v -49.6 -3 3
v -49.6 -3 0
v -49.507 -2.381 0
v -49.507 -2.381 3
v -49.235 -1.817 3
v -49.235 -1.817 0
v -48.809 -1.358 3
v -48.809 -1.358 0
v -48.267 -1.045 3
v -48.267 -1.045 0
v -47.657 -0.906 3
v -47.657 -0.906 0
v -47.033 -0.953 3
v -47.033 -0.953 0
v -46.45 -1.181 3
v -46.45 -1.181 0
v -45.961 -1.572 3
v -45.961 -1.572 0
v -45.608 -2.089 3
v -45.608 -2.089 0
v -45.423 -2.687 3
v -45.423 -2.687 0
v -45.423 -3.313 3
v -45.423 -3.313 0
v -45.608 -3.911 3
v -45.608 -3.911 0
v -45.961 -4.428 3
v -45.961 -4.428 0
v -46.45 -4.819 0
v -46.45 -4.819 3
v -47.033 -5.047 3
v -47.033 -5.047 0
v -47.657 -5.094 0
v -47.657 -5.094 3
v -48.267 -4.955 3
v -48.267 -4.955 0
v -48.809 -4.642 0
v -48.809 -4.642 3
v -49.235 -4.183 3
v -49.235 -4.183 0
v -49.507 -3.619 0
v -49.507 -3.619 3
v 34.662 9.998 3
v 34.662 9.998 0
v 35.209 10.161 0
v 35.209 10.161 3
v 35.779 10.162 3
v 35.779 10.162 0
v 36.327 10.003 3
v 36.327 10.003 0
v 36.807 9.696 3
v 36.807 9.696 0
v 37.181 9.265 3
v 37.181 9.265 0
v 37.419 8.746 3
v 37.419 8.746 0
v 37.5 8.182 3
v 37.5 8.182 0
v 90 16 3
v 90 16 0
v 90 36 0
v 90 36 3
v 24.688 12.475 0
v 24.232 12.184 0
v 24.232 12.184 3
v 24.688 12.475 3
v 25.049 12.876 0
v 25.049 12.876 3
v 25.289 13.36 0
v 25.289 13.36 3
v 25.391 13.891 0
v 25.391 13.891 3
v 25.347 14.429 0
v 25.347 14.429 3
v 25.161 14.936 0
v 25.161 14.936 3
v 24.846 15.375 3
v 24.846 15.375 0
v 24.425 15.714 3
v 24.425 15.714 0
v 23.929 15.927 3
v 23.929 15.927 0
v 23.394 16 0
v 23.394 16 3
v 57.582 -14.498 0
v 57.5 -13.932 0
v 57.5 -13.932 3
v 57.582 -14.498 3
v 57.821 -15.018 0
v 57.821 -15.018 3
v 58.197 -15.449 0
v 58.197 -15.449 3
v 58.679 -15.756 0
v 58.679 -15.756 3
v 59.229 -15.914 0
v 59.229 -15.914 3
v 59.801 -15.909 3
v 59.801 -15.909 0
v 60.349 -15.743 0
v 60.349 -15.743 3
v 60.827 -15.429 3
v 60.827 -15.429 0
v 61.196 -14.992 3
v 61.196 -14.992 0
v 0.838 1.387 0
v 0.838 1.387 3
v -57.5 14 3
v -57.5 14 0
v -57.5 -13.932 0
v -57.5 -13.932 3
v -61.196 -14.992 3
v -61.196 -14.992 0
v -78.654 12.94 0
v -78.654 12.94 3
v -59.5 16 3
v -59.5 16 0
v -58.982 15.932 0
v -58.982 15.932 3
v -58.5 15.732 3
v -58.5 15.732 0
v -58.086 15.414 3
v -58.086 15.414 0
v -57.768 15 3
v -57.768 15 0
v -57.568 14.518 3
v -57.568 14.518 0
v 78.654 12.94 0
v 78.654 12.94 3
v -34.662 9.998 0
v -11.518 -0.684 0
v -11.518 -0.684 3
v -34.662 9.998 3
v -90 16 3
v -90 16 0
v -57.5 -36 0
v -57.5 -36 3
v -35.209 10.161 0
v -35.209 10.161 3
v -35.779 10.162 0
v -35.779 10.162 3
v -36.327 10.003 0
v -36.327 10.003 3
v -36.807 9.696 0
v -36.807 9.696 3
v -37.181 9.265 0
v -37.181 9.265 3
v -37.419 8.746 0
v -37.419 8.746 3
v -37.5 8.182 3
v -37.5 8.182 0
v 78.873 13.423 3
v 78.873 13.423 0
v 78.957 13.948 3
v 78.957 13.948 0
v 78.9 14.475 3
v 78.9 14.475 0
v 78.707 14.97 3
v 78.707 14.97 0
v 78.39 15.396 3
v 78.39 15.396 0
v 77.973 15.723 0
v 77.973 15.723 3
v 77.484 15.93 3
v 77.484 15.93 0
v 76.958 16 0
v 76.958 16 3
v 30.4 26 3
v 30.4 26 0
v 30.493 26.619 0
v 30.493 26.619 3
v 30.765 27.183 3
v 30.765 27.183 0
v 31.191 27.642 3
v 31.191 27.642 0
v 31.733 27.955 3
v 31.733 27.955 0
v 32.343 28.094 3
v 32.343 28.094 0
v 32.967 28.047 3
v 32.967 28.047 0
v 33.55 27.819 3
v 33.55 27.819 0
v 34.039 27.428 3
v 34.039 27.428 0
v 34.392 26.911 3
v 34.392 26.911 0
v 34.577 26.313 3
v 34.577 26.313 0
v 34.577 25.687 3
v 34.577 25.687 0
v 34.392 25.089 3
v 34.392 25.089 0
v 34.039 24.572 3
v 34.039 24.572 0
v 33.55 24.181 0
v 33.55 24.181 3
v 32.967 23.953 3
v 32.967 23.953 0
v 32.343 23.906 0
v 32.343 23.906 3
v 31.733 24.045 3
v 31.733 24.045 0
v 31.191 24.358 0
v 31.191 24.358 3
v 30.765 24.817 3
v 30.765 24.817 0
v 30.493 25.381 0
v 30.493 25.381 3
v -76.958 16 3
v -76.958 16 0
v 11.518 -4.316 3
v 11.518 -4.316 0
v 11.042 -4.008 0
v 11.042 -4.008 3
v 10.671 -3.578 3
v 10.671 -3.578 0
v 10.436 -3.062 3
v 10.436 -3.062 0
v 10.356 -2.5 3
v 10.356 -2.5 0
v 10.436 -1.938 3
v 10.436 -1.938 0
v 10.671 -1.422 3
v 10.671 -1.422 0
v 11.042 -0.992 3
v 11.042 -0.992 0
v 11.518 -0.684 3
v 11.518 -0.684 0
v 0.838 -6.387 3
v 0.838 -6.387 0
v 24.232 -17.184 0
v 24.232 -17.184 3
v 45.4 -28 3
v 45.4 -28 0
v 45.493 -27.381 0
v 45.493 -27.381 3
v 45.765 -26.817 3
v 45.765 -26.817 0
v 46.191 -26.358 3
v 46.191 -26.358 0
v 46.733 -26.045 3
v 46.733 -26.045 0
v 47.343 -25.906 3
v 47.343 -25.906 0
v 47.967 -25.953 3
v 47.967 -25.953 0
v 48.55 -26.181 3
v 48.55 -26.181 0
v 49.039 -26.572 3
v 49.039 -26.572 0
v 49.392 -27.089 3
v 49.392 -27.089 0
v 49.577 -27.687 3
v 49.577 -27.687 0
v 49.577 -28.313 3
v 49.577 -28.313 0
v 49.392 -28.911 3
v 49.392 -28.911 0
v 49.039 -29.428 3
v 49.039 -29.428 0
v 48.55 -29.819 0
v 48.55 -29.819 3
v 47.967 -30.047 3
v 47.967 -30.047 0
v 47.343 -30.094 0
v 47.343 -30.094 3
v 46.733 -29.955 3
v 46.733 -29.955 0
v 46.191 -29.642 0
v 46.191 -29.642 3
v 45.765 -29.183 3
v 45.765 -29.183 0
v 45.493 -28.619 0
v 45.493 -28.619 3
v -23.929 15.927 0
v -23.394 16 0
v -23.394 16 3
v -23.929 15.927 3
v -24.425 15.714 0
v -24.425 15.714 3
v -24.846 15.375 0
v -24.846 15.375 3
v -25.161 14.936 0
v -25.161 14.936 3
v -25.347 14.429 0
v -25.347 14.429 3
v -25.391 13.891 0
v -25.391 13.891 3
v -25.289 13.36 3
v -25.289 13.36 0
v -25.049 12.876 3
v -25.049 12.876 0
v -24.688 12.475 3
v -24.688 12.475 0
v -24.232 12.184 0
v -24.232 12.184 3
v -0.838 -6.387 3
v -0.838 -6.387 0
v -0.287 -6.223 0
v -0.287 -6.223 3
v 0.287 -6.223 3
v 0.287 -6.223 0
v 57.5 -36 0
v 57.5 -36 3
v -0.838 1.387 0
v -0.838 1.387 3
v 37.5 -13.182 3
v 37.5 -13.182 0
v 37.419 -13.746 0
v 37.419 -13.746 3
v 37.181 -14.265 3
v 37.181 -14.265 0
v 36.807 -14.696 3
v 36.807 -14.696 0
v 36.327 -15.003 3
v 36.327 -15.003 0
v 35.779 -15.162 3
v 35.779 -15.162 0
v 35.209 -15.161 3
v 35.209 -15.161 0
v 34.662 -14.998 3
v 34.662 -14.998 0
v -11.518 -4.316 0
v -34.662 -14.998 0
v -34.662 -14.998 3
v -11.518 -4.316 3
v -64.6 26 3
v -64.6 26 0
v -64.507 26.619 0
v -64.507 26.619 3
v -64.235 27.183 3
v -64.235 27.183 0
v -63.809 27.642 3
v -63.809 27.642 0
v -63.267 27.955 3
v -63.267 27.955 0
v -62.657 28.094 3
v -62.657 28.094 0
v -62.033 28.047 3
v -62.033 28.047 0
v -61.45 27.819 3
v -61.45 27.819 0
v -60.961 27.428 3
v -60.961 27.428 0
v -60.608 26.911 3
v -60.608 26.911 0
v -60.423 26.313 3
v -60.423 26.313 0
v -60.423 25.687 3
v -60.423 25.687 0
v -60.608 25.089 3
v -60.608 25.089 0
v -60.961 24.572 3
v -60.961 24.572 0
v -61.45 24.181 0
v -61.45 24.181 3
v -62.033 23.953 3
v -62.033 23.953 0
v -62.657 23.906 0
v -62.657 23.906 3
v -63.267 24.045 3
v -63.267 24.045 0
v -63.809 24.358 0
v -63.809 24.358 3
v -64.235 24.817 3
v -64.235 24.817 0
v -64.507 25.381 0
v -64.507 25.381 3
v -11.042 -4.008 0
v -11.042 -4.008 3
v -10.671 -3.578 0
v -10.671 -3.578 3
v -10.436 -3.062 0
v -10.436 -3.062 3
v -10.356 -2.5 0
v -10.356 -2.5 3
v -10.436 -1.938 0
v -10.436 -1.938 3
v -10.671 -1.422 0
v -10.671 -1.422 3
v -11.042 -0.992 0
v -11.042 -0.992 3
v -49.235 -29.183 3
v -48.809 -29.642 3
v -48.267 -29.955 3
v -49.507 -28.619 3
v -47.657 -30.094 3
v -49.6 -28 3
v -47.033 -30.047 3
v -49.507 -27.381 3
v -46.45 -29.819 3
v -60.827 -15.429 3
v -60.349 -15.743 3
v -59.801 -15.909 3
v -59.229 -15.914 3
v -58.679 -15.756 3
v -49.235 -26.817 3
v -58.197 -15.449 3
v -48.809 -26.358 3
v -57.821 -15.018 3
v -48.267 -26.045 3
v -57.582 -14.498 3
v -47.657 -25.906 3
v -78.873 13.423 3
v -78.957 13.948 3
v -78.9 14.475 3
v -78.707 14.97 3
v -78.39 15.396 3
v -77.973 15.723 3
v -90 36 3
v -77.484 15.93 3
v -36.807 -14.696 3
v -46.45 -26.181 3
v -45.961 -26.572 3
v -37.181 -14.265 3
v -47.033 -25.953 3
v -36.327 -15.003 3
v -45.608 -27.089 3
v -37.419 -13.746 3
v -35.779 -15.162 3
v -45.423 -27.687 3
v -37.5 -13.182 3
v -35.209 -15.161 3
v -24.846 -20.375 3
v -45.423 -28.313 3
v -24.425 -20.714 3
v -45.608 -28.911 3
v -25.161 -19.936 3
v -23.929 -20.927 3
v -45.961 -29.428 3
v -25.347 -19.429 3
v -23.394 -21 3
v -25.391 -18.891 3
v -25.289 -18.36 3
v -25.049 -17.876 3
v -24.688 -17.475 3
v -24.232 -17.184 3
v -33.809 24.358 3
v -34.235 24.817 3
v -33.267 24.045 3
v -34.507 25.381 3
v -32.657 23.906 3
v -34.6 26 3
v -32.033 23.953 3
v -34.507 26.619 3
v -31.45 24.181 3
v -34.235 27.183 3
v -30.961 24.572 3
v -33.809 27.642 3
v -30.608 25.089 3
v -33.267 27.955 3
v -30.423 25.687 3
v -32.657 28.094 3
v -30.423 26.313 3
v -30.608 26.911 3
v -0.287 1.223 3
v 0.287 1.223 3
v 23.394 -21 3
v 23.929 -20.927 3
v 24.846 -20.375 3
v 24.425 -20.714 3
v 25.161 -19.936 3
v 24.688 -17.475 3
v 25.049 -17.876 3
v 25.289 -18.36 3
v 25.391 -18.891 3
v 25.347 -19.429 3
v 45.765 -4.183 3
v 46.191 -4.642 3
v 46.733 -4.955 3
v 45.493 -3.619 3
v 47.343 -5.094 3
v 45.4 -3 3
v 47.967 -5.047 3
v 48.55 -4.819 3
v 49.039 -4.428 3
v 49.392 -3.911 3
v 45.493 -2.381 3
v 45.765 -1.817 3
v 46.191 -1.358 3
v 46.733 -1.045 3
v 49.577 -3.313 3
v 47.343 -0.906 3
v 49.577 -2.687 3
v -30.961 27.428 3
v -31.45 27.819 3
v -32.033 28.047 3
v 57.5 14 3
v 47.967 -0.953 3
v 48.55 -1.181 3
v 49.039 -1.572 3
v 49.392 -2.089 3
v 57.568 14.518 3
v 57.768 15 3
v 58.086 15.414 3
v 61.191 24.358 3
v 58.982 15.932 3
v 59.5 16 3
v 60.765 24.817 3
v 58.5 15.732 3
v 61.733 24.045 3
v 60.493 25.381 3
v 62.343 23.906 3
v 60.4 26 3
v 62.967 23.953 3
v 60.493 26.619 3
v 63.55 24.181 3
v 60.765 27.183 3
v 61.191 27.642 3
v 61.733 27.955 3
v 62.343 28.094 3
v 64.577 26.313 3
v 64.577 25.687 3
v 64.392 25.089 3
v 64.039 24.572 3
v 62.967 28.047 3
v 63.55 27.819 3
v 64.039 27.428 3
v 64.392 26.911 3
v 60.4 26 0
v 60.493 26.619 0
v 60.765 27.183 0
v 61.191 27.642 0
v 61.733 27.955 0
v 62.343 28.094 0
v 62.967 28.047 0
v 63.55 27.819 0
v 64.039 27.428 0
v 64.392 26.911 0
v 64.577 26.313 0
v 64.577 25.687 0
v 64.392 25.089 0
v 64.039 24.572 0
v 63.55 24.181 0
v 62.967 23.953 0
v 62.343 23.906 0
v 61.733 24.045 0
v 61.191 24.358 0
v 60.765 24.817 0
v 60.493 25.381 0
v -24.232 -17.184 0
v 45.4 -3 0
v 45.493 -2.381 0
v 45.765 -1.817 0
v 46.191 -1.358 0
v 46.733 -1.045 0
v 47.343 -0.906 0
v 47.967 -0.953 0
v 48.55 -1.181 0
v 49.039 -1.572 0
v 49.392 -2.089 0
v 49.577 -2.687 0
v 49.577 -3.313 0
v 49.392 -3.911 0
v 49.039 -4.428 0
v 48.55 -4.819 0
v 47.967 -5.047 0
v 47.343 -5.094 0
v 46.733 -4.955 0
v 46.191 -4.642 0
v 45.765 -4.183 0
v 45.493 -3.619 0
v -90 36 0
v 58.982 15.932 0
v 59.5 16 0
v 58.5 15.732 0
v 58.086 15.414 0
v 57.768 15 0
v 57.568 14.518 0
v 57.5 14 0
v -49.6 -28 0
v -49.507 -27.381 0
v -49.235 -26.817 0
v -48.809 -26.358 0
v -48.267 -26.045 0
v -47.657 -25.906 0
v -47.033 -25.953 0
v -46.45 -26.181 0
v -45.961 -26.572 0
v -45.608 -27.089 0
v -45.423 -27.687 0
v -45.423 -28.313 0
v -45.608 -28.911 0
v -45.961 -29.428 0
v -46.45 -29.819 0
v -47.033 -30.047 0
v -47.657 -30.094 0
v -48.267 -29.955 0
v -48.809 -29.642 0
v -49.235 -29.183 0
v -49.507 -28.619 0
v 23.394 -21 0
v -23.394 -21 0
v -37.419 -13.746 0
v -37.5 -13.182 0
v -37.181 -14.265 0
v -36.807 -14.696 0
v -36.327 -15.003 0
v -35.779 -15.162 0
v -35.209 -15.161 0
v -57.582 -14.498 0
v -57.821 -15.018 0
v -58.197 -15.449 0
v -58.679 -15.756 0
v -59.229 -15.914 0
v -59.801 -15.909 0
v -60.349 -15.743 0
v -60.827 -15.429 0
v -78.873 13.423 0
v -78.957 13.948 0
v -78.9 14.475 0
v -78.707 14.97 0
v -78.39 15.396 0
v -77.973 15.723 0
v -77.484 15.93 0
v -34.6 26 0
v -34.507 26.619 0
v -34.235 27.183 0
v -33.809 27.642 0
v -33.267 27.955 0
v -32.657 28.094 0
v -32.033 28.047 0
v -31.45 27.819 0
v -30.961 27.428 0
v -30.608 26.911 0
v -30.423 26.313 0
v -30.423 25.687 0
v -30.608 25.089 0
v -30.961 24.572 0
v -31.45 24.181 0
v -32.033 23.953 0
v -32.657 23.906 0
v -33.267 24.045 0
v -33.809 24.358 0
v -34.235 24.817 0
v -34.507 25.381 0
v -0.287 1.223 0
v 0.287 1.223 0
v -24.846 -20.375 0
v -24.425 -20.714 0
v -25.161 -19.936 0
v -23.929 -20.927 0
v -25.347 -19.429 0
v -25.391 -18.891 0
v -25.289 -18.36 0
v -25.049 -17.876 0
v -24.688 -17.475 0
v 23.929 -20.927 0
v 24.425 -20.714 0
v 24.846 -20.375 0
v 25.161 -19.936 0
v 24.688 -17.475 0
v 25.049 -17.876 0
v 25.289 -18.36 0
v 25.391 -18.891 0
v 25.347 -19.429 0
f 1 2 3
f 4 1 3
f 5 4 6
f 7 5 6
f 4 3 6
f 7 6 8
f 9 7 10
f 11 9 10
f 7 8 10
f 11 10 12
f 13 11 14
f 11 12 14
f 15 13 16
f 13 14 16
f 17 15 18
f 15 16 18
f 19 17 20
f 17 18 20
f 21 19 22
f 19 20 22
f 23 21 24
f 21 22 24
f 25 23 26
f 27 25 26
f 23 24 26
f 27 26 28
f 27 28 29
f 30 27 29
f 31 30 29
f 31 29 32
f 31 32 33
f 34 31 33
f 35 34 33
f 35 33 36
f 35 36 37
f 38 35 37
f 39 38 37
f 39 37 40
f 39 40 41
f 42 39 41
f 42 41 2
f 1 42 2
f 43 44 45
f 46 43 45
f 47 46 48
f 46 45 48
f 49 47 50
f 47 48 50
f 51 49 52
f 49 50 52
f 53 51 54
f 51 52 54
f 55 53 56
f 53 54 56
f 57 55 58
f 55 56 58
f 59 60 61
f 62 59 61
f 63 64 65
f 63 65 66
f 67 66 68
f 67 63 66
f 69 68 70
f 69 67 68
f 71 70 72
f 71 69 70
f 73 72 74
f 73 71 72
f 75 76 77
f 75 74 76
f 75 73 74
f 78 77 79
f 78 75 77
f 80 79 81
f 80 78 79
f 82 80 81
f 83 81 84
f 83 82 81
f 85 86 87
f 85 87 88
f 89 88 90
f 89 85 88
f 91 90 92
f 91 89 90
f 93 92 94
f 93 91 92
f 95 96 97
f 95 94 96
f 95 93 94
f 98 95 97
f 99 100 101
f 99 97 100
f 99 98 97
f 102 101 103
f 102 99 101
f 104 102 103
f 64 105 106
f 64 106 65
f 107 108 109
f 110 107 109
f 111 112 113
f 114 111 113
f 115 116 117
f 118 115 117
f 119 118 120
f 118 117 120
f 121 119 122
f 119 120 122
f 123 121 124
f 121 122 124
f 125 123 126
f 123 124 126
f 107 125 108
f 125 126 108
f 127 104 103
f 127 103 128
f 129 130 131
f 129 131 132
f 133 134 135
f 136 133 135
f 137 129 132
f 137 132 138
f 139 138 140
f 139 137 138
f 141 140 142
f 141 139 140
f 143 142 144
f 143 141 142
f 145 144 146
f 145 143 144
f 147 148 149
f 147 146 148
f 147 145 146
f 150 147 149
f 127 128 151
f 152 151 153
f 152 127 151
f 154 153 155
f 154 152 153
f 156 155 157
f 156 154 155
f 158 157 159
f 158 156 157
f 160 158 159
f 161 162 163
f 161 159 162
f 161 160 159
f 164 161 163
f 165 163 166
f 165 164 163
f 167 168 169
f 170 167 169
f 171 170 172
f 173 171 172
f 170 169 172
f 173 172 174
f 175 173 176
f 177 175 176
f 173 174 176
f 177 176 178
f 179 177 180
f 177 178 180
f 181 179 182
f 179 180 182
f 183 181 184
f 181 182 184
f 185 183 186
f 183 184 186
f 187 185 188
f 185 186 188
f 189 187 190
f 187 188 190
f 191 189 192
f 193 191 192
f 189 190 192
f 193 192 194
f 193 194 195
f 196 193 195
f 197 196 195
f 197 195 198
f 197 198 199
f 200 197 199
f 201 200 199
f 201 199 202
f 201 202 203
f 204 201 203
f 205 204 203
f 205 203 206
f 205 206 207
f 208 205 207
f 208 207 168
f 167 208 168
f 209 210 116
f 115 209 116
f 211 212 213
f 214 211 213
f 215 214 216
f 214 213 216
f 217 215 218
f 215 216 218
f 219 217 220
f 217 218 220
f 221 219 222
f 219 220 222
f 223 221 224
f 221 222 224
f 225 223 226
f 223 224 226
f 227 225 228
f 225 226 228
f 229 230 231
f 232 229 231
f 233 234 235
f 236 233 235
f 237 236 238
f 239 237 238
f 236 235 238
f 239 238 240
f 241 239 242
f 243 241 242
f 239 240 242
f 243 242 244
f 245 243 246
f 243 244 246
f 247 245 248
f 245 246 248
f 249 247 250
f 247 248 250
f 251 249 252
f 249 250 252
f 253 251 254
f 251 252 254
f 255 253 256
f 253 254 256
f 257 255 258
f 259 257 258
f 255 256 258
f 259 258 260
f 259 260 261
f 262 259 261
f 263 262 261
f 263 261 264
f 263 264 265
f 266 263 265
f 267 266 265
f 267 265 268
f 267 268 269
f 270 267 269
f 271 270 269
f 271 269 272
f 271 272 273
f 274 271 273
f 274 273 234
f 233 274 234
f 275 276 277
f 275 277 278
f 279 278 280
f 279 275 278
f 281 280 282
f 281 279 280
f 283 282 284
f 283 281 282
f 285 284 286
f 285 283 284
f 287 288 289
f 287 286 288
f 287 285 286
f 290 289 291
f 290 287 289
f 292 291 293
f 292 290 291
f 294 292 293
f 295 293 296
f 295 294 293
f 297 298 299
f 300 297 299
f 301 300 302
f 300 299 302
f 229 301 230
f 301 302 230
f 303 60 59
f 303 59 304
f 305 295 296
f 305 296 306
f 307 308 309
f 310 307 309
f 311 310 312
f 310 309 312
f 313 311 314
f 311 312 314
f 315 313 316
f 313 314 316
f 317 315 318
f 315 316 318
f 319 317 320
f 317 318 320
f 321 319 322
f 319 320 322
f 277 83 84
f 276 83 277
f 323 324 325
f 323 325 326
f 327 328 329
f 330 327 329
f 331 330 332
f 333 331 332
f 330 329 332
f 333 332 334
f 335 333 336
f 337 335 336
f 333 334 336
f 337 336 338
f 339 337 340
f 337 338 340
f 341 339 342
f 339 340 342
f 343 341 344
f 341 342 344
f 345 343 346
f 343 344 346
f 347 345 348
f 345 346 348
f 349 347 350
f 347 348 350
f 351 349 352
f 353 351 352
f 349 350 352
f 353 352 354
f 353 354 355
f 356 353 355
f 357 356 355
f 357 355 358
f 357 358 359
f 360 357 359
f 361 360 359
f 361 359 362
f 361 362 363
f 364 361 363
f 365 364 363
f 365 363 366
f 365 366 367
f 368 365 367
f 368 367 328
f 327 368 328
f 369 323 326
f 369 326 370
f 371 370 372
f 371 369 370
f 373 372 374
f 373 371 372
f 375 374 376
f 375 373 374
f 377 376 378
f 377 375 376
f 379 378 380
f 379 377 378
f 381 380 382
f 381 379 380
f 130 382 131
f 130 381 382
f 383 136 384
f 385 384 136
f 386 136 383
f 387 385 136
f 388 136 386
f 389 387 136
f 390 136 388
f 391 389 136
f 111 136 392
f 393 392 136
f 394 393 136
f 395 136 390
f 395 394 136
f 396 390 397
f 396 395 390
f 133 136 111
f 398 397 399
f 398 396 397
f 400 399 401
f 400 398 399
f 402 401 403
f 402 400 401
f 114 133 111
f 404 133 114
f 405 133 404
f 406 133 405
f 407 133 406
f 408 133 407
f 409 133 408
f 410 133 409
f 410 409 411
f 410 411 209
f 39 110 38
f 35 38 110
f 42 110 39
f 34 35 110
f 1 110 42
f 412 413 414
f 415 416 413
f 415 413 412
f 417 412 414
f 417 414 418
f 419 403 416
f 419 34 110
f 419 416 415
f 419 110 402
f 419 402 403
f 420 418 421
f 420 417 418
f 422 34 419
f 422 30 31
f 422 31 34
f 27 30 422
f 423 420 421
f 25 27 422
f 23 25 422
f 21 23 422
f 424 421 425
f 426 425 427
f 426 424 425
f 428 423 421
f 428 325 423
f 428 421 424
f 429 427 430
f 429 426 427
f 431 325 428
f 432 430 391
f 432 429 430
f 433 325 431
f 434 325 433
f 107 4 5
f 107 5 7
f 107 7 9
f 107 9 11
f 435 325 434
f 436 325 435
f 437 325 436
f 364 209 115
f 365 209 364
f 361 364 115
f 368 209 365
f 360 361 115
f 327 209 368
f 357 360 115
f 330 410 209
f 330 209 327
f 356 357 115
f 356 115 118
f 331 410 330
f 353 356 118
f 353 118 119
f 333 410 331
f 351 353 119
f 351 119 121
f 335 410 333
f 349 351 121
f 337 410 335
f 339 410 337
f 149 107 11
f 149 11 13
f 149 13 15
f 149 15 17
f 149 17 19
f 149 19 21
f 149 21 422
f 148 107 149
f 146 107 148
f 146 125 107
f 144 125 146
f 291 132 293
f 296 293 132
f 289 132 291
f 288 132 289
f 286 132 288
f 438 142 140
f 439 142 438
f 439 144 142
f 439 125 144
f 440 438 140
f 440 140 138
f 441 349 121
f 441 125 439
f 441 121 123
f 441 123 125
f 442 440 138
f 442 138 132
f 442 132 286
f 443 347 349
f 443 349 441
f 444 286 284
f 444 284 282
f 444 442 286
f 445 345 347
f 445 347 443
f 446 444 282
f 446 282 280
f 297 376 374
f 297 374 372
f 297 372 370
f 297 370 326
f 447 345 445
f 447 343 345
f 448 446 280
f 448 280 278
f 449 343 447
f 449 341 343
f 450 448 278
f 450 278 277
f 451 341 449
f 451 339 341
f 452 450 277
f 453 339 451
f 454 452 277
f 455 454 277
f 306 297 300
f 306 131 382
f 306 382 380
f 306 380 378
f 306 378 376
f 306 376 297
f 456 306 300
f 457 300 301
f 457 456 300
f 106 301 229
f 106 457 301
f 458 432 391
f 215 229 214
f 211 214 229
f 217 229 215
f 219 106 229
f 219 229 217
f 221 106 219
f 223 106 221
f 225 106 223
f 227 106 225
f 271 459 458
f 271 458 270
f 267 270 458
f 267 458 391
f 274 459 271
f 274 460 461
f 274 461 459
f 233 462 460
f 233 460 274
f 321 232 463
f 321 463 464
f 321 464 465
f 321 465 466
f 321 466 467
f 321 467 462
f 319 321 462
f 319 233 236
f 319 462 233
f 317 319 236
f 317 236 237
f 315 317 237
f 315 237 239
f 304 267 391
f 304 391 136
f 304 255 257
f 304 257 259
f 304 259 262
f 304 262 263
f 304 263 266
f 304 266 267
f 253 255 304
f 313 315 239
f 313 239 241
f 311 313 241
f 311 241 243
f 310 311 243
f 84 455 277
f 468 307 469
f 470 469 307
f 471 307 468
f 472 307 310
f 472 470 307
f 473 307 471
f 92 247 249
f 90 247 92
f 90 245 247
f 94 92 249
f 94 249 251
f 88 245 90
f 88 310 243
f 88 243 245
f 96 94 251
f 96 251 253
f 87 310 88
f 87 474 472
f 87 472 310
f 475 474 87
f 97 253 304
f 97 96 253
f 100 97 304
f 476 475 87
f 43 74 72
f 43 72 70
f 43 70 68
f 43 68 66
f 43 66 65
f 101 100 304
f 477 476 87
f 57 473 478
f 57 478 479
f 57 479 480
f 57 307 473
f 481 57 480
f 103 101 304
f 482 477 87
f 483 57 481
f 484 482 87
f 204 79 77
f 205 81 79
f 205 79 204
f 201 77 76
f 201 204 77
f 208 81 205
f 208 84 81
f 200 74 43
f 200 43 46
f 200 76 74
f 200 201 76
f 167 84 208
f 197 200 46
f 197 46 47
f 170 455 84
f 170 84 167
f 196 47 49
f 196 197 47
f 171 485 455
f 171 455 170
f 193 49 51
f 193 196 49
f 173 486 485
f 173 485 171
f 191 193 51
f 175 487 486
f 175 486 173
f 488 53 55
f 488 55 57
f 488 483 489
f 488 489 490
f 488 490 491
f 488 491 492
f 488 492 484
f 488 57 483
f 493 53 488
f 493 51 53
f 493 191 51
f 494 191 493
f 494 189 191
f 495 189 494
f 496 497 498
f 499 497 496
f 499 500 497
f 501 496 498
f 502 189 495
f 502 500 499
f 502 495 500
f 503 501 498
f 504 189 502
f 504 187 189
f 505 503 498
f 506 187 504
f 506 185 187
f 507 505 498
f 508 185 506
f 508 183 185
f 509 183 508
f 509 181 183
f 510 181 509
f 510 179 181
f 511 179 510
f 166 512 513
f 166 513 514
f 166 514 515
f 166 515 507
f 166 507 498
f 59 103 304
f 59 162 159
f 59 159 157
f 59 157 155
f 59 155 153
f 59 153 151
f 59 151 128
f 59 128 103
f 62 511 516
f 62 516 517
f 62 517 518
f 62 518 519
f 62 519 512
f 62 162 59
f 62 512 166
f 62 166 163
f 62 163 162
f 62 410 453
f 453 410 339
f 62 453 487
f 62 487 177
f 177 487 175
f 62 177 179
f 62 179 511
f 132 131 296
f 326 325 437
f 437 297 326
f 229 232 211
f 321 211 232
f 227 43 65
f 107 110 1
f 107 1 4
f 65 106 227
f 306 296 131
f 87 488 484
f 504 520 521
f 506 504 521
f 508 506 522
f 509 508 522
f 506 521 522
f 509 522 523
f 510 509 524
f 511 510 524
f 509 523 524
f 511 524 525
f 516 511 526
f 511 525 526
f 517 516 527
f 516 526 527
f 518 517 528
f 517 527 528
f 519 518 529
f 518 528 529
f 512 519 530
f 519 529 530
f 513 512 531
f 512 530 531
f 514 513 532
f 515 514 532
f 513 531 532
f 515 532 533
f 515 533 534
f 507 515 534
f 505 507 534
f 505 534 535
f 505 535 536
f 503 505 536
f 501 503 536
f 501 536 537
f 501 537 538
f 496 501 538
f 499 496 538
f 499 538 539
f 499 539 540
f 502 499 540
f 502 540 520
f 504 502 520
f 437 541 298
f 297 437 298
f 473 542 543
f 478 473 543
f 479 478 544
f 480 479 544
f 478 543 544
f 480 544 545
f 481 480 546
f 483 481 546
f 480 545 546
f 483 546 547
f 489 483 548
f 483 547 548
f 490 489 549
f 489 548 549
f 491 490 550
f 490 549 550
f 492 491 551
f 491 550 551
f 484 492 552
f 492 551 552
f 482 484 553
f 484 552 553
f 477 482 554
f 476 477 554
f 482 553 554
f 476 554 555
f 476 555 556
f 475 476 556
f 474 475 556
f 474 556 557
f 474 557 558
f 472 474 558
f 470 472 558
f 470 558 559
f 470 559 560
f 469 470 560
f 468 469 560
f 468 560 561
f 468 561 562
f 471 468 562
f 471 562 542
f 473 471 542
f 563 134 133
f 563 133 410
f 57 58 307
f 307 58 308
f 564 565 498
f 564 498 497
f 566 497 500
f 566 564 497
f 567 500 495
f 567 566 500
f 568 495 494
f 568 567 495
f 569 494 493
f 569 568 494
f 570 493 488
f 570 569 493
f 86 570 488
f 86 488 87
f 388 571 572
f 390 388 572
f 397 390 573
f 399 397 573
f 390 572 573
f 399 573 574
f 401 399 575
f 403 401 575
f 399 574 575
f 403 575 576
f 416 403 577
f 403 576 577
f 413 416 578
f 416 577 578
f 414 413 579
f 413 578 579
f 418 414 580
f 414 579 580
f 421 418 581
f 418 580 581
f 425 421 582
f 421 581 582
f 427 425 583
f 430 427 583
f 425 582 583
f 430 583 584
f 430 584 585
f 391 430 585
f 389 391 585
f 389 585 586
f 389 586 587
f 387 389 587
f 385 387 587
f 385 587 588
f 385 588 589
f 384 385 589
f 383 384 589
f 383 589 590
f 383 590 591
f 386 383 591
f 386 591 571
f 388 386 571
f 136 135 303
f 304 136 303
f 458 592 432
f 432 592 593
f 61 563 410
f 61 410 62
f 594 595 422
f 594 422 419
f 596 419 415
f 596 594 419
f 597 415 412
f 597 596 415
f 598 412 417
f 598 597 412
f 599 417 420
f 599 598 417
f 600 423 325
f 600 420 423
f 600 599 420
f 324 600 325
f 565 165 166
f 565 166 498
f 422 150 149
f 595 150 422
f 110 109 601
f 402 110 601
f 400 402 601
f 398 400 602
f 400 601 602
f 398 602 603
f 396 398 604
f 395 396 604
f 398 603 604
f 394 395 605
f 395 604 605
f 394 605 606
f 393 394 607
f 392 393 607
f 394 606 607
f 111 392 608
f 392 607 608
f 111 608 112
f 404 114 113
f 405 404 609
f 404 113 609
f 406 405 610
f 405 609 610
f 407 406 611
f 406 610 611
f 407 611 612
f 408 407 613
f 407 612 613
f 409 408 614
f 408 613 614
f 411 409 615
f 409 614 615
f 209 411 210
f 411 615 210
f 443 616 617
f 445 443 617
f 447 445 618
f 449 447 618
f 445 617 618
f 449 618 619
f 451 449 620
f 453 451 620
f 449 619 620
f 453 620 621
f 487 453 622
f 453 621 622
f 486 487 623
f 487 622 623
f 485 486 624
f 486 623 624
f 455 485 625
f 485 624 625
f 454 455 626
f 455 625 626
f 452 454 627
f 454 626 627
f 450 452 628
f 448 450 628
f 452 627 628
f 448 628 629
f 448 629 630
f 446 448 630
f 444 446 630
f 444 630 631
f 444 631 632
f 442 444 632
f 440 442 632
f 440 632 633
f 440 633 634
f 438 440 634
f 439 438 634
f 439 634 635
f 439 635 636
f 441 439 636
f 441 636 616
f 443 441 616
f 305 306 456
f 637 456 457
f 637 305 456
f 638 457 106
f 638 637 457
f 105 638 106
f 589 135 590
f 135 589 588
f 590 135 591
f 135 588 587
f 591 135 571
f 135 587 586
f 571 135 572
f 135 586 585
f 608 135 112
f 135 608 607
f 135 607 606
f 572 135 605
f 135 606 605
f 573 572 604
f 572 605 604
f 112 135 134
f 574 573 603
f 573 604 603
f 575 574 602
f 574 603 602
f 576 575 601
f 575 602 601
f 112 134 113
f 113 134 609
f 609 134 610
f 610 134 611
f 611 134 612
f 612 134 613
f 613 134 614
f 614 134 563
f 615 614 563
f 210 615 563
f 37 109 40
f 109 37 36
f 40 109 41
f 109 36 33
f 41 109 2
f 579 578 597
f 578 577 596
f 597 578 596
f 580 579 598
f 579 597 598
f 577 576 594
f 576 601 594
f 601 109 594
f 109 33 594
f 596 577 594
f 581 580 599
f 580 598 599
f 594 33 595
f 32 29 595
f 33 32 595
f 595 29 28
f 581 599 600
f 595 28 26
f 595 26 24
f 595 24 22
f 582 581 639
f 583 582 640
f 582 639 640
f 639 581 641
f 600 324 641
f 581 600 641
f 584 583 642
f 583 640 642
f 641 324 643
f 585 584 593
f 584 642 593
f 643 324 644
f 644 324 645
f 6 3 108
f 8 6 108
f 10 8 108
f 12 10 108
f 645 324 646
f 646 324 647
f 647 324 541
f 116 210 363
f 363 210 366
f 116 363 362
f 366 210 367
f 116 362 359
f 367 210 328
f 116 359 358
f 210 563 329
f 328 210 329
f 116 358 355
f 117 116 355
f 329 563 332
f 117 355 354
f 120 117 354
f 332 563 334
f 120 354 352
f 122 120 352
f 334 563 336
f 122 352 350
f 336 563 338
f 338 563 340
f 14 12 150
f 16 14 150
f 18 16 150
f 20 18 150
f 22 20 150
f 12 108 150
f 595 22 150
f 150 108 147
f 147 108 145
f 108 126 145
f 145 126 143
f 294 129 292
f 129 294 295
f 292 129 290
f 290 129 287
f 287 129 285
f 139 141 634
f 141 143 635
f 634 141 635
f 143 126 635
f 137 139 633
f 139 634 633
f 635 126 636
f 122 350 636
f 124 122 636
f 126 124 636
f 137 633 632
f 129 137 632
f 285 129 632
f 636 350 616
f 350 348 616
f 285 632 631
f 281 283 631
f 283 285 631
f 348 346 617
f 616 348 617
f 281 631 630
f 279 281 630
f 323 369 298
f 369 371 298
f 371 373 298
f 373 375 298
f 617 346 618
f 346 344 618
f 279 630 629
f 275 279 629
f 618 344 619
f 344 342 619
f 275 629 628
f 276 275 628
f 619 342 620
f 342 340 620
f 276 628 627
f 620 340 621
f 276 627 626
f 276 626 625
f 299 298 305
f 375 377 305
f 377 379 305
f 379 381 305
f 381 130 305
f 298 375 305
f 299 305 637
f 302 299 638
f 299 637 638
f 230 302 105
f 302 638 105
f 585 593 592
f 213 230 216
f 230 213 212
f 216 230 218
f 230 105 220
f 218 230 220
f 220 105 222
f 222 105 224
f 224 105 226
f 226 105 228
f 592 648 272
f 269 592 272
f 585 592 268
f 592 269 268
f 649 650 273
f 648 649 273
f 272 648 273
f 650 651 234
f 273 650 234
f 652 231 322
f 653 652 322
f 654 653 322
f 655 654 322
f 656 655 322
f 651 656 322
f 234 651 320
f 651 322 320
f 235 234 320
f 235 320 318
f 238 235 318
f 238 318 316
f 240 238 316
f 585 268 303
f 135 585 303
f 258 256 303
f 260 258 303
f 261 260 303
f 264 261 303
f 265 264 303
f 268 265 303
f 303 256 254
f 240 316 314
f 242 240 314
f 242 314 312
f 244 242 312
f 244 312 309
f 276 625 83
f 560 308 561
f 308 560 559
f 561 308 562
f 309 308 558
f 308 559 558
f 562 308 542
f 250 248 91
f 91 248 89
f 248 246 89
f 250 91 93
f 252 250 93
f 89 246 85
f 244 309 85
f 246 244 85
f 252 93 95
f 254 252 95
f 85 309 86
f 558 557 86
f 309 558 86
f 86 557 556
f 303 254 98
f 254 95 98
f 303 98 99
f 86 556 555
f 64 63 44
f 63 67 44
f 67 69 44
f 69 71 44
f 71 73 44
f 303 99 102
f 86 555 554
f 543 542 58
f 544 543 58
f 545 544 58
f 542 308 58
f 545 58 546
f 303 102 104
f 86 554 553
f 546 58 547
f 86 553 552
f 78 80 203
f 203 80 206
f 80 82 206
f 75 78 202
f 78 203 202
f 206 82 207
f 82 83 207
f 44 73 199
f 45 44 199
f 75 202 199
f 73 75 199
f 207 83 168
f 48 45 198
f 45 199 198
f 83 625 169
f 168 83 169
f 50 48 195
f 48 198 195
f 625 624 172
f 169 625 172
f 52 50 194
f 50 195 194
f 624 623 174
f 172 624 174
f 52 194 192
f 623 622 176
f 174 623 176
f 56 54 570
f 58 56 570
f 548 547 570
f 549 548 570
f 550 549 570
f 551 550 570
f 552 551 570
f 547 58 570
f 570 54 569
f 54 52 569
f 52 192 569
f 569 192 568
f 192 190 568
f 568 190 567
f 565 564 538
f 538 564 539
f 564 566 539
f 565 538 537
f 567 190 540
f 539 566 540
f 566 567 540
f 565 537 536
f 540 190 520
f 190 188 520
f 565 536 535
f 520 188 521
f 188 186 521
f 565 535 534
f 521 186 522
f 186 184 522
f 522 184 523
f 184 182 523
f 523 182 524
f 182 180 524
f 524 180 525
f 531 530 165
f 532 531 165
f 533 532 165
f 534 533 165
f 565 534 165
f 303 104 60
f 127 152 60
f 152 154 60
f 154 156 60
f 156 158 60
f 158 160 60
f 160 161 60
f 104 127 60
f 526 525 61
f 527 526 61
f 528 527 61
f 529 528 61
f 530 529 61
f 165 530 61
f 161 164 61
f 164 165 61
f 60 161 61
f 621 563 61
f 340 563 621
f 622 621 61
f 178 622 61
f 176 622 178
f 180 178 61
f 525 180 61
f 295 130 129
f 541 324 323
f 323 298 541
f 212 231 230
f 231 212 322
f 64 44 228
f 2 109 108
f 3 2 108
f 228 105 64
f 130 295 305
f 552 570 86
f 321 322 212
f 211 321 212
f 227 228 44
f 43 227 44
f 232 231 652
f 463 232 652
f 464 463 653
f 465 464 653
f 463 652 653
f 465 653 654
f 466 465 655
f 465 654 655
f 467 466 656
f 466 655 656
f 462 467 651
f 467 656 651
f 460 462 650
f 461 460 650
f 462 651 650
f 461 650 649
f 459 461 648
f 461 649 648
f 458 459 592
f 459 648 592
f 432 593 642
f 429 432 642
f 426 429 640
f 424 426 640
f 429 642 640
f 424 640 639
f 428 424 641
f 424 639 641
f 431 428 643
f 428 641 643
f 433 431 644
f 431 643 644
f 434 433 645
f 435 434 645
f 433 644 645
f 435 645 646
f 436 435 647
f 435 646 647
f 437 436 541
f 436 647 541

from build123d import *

# Parameters (mm, degrees)
SKETCH_1_W              = 180
SKETCH_1_H              = 72
EXTRUDE_1_DEPTH         = 3
HOLE_WIZARD_4_2_4_2_1_D = 4.2
CUT_EXTRUDE_2_DEPTH     = 97.979379251
CUT_EXTRUDE_3_DEPTH     = 97.979379251


with BuildPart() as part:
    # 草图1 → 凸台-拉伸1 (new body)
    with BuildSketch(Plane.XY):
        Rectangle(SKETCH_1_W, SKETCH_1_H)
    extrude(amount=EXTRUDE_1_DEPTH)

    # Ø4.2 (4.2) 直径孔1 (through all)
    with Locations(Plane(origin=(-62.5, 26, 3), x_dir=(1, 0, 0), z_dir=(0, 0, 1))):
        with Locations((0, 0), (30, 0), (15, -29), (15, -54), (110, -54), (110, -29), (125, 0), (95, 0)):
            Hole(HOLE_WIZARD_4_2_4_2_1_D / 2)

    # 草图8 → 切除-拉伸2 (cut, through all)
    with BuildSketch(Plane(origin=(0, 0, 0), x_dir=(-1, 0, 0), z_dir=(0, 0, -1))):
        Polygon((-90, 16), (-57.5, -36), (-90, -36), align=None)
        Polygon((90, -36), (90, 16), (57.5, -36), align=None)
    extrude(amount=-CUT_EXTRUDE_2_DEPTH, mode=Mode.SUBTRACT)

    # 草图6 → 切除-拉伸3 (cut, through all)
    with BuildSketch(Plane(origin=(0, 0, 0), x_dir=(-1, 0, 0), z_dir=(0, 0, -1))):
        with BuildLine():
            Line((57.5, 14), (57.5, -13.932037736))
            ThreePointArc((57.5, -13.932037736), (58.948634974, -15.854535228), (61.195996608, -14.992035616))
            Line((61.195996608, -14.992035616), (78.653520193, 12.94000212))
            ThreePointArc((78.653520193, 12.94000212), (78.706808547, 14.969537065), (76.957523585, 16))
            Line((76.957523585, 16), (59.5, 16))
            ThreePointArc((59.5, 16), (58.085786438, 15.414213562), (57.5, 14))
        make_face()
        with BuildLine():
            Line((-76.957523585, 16), (-59.5, 16))
            ThreePointArc((-59.5, 16), (-58.085786438, 15.414213562), (-57.5, 14))
            Line((-57.5, 14), (-57.5, -13.932037736))
            ThreePointArc((-57.5, -13.932037736), (-58.948634974, -15.854535228), (-61.195996608, -14.992035616))
            Line((-61.195996608, -14.992035616), (-78.653520193, 12.94000212))
            ThreePointArc((-78.653520193, 12.94000212), (-78.706808547, 14.969537065), (-76.957523585, 16))
        make_face()
        with BuildLine():
            Line((-23.394059646, 16), (23.394059646, 16))
            ThreePointArc((23.394059646, 16), (25.347497325, 14.429046887), (24.232176, 12.184081231))
            Line((24.232176, 12.184081231), (0.838116355, 1.386822933))
            ThreePointArc((0.838116355, 1.386822933), (0, 1.202741702), (-0.838116355, 1.386822933))
            Line((-0.838116355, 1.386822933), (-24.232176, 12.184081231))
            ThreePointArc((-24.232176, 12.184081231), (-25.347497325, 14.429046887), (-23.394059646, 16))
        make_face()
        with BuildLine():
            Line((-37.5, 8.181873683), (-37.5, -13.181873683))
            ThreePointArc((-37.5, -13.181873683), (-36.577907067, -14.866544676), (-34.661883645, -14.997792452))
            Line((-34.661883645, -14.997792452), (-11.517824, -4.315918769))
            ThreePointArc((-11.517824, -4.315918769), (-10.355940354, -2.5), (-11.517824, -0.684081231))
            Line((-11.517824, -0.684081231), (-34.661883645, 9.997792452))
            ThreePointArc((-34.661883645, 9.997792452), (-36.577907067, 9.866544676), (-37.5, 8.181873683))
        make_face()
        with BuildLine():
            Line((-23.394059646, -21), (23.394059646, -21))
            ThreePointArc((23.394059646, -21), (25.347497325, -19.429046887), (24.232176, -17.184081231))
            Line((24.232176, -17.184081231), (0.838116355, -6.386822933))
            ThreePointArc((0.838116355, -6.386822933), (0, -6.202741702), (-0.838116355, -6.386822933))
            Line((-0.838116355, -6.386822933), (-24.232176, -17.184081231))
            ThreePointArc((-24.232176, -17.184081231), (-25.347497325, -19.429046887), (-23.394059646, -21))
        make_face()
        with BuildLine():
            Line((37.5, 8.181873683), (37.5, -13.181873683))
            ThreePointArc((37.5, -13.181873683), (36.577907067, -14.866544676), (34.661883645, -14.997792452))
            Line((34.661883645, -14.997792452), (11.517824, -4.315918769))
            ThreePointArc((11.517824, -4.315918769), (10.355940354, -2.5), (11.517824, -0.684081231))
            Line((11.517824, -0.684081231), (34.661883645, 9.997792452))
            ThreePointArc((34.661883645, 9.997792452), (36.577907067, 9.866544676), (37.5, 8.181873683))
        make_face()
    extrude(amount=-CUT_EXTRUDE_3_DEPTH, mode=Mode.SUBTRACT)


solid = part.part
